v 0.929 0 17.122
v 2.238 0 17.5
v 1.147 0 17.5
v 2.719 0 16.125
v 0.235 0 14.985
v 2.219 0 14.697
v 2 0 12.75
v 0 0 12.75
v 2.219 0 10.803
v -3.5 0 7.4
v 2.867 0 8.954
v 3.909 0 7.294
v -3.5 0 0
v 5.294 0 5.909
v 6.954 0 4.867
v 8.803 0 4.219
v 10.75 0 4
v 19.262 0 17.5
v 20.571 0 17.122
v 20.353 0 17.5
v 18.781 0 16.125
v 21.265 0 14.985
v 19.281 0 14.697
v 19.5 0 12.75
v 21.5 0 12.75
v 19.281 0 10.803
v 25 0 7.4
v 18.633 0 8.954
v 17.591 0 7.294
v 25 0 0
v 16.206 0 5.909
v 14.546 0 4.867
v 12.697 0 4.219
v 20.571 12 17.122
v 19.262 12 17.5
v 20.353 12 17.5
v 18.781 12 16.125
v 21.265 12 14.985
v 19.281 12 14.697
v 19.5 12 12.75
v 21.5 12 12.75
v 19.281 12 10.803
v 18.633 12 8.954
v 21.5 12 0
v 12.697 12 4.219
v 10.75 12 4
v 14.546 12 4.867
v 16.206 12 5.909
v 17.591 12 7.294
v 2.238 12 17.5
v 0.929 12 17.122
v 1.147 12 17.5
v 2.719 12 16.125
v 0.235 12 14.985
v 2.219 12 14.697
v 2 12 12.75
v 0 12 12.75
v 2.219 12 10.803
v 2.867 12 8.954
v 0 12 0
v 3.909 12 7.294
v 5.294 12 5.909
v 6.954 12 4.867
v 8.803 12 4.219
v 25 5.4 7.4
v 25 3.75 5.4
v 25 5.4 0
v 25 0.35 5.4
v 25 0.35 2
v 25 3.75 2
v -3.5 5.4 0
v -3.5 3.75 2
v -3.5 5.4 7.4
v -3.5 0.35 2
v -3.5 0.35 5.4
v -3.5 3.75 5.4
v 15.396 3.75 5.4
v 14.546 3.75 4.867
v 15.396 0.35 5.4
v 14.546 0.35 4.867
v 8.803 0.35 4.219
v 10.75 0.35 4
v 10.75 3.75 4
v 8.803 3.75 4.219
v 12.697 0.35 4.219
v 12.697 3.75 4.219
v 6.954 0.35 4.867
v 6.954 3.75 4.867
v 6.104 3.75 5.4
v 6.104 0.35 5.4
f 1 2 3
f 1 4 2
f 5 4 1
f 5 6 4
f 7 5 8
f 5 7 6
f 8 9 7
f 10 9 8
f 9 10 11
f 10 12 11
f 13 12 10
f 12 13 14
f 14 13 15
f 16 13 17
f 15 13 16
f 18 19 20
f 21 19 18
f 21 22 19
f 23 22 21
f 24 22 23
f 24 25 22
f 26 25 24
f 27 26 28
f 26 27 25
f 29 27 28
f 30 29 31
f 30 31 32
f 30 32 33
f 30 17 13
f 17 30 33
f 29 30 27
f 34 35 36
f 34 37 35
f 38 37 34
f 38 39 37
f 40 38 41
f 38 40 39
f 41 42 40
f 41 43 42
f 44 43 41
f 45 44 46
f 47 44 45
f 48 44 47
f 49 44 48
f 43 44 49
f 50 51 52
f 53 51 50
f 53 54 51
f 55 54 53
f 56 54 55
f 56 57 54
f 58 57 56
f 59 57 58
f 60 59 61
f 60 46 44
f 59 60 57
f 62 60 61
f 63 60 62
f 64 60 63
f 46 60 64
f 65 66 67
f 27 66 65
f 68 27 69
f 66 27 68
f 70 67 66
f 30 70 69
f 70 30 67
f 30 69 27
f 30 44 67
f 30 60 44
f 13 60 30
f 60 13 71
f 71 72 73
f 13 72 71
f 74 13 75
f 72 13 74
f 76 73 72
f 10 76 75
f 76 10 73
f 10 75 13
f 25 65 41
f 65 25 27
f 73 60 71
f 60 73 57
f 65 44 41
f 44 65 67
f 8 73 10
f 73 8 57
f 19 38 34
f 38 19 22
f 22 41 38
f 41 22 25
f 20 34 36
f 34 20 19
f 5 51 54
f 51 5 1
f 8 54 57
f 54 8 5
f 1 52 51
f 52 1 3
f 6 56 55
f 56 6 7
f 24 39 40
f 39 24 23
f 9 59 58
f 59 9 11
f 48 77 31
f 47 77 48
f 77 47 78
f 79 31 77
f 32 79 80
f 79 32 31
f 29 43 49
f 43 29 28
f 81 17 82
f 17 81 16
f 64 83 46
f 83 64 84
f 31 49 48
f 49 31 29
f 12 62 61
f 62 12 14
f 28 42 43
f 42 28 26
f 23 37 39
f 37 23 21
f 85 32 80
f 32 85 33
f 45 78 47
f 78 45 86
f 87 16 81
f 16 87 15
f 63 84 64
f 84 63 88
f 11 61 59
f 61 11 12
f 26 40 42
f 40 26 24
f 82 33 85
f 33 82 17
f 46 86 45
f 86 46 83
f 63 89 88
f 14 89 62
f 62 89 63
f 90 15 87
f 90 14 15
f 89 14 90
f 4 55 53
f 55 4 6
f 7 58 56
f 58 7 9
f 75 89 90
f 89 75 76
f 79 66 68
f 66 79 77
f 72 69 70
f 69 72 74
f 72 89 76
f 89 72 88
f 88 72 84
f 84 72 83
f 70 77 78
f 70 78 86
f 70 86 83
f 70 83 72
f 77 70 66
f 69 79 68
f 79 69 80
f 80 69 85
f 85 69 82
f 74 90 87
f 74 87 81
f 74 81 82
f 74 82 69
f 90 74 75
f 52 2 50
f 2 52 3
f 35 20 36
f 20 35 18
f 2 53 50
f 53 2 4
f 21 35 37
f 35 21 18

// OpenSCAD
CenterHole = 17.5; // Width across the Night Light base
HoleDepth = 12; // Height of the night light base

Thickness = 2; // How thick you want the walls of the printed part

LithographFrameThickness = 3.4; //Thickness of the Lithopane frame. 
FrameHolderLength = 28.5; // Widfth of arms of the support for the frame. The total width of the nightlight may look good

SupportWidth = .35; // Used for a better bridge over the notch for the Lithopane Frame. Simply peel it out of the slot by grabbing it in the ring.


difference()
{
	union()
	{
		hull()
		{
			// base of the bracket
			cube([CenterHole + (Thickness * 2), HoleDepth, (CenterHole + (Thickness * 2))/2 + Thickness]);
			// support arms for lithopane frame
			translate([ -(FrameHolderLength - (CenterHole + (Thickness * 2))) / 2, 0, 0])
				cube([FrameHolderLength, LithographFrameThickness + Thickness, LithographFrameThickness + (Thickness * 2)]);
		}

	// ring
	translate([(CenterHole + (Thickness * 2))/2, HoleDepth, (CenterHole + (Thickness * 2)) /2 + Thickness]) 
		rotate([90,0,0]) 
			cylinder(r=(CenterHole + (Thickness * 2)) / 2, h=HoleDepth);
	}

	// make the hole
	translate([(CenterHole + (Thickness * 2))/2, HoleDepth, (CenterHole + (Thickness * 2)) /2 + Thickness]) 
		rotate([90,0,0]) 
			cylinder(r=(CenterHole ) / 2, h=HoleDepth);

	// slot for the lithopane
	translate([ -(FrameHolderLength - (CenterHole + (Thickness * 2))) / 2, SupportWidth, Thickness])
			cube([FrameHolderLength, LithographFrameThickness , LithographFrameThickness]);
	
	//knock out of the ring
	translate([0,0,CenterHole  ])
		cube([CenterHole + (Thickness * 2), HoleDepth, (CenterHole + (Thickness * 2))/2 + Thickness]);
	
	// clean up the knockout
	translate([(CenterHole + (Thickness * 2))/2, HoleDepth, CenterHole + Thickness]) 
		rotate([90,0,0]) 
			 cylinder(r=(CenterHole ) / 2, h=HoleDepth);

}
